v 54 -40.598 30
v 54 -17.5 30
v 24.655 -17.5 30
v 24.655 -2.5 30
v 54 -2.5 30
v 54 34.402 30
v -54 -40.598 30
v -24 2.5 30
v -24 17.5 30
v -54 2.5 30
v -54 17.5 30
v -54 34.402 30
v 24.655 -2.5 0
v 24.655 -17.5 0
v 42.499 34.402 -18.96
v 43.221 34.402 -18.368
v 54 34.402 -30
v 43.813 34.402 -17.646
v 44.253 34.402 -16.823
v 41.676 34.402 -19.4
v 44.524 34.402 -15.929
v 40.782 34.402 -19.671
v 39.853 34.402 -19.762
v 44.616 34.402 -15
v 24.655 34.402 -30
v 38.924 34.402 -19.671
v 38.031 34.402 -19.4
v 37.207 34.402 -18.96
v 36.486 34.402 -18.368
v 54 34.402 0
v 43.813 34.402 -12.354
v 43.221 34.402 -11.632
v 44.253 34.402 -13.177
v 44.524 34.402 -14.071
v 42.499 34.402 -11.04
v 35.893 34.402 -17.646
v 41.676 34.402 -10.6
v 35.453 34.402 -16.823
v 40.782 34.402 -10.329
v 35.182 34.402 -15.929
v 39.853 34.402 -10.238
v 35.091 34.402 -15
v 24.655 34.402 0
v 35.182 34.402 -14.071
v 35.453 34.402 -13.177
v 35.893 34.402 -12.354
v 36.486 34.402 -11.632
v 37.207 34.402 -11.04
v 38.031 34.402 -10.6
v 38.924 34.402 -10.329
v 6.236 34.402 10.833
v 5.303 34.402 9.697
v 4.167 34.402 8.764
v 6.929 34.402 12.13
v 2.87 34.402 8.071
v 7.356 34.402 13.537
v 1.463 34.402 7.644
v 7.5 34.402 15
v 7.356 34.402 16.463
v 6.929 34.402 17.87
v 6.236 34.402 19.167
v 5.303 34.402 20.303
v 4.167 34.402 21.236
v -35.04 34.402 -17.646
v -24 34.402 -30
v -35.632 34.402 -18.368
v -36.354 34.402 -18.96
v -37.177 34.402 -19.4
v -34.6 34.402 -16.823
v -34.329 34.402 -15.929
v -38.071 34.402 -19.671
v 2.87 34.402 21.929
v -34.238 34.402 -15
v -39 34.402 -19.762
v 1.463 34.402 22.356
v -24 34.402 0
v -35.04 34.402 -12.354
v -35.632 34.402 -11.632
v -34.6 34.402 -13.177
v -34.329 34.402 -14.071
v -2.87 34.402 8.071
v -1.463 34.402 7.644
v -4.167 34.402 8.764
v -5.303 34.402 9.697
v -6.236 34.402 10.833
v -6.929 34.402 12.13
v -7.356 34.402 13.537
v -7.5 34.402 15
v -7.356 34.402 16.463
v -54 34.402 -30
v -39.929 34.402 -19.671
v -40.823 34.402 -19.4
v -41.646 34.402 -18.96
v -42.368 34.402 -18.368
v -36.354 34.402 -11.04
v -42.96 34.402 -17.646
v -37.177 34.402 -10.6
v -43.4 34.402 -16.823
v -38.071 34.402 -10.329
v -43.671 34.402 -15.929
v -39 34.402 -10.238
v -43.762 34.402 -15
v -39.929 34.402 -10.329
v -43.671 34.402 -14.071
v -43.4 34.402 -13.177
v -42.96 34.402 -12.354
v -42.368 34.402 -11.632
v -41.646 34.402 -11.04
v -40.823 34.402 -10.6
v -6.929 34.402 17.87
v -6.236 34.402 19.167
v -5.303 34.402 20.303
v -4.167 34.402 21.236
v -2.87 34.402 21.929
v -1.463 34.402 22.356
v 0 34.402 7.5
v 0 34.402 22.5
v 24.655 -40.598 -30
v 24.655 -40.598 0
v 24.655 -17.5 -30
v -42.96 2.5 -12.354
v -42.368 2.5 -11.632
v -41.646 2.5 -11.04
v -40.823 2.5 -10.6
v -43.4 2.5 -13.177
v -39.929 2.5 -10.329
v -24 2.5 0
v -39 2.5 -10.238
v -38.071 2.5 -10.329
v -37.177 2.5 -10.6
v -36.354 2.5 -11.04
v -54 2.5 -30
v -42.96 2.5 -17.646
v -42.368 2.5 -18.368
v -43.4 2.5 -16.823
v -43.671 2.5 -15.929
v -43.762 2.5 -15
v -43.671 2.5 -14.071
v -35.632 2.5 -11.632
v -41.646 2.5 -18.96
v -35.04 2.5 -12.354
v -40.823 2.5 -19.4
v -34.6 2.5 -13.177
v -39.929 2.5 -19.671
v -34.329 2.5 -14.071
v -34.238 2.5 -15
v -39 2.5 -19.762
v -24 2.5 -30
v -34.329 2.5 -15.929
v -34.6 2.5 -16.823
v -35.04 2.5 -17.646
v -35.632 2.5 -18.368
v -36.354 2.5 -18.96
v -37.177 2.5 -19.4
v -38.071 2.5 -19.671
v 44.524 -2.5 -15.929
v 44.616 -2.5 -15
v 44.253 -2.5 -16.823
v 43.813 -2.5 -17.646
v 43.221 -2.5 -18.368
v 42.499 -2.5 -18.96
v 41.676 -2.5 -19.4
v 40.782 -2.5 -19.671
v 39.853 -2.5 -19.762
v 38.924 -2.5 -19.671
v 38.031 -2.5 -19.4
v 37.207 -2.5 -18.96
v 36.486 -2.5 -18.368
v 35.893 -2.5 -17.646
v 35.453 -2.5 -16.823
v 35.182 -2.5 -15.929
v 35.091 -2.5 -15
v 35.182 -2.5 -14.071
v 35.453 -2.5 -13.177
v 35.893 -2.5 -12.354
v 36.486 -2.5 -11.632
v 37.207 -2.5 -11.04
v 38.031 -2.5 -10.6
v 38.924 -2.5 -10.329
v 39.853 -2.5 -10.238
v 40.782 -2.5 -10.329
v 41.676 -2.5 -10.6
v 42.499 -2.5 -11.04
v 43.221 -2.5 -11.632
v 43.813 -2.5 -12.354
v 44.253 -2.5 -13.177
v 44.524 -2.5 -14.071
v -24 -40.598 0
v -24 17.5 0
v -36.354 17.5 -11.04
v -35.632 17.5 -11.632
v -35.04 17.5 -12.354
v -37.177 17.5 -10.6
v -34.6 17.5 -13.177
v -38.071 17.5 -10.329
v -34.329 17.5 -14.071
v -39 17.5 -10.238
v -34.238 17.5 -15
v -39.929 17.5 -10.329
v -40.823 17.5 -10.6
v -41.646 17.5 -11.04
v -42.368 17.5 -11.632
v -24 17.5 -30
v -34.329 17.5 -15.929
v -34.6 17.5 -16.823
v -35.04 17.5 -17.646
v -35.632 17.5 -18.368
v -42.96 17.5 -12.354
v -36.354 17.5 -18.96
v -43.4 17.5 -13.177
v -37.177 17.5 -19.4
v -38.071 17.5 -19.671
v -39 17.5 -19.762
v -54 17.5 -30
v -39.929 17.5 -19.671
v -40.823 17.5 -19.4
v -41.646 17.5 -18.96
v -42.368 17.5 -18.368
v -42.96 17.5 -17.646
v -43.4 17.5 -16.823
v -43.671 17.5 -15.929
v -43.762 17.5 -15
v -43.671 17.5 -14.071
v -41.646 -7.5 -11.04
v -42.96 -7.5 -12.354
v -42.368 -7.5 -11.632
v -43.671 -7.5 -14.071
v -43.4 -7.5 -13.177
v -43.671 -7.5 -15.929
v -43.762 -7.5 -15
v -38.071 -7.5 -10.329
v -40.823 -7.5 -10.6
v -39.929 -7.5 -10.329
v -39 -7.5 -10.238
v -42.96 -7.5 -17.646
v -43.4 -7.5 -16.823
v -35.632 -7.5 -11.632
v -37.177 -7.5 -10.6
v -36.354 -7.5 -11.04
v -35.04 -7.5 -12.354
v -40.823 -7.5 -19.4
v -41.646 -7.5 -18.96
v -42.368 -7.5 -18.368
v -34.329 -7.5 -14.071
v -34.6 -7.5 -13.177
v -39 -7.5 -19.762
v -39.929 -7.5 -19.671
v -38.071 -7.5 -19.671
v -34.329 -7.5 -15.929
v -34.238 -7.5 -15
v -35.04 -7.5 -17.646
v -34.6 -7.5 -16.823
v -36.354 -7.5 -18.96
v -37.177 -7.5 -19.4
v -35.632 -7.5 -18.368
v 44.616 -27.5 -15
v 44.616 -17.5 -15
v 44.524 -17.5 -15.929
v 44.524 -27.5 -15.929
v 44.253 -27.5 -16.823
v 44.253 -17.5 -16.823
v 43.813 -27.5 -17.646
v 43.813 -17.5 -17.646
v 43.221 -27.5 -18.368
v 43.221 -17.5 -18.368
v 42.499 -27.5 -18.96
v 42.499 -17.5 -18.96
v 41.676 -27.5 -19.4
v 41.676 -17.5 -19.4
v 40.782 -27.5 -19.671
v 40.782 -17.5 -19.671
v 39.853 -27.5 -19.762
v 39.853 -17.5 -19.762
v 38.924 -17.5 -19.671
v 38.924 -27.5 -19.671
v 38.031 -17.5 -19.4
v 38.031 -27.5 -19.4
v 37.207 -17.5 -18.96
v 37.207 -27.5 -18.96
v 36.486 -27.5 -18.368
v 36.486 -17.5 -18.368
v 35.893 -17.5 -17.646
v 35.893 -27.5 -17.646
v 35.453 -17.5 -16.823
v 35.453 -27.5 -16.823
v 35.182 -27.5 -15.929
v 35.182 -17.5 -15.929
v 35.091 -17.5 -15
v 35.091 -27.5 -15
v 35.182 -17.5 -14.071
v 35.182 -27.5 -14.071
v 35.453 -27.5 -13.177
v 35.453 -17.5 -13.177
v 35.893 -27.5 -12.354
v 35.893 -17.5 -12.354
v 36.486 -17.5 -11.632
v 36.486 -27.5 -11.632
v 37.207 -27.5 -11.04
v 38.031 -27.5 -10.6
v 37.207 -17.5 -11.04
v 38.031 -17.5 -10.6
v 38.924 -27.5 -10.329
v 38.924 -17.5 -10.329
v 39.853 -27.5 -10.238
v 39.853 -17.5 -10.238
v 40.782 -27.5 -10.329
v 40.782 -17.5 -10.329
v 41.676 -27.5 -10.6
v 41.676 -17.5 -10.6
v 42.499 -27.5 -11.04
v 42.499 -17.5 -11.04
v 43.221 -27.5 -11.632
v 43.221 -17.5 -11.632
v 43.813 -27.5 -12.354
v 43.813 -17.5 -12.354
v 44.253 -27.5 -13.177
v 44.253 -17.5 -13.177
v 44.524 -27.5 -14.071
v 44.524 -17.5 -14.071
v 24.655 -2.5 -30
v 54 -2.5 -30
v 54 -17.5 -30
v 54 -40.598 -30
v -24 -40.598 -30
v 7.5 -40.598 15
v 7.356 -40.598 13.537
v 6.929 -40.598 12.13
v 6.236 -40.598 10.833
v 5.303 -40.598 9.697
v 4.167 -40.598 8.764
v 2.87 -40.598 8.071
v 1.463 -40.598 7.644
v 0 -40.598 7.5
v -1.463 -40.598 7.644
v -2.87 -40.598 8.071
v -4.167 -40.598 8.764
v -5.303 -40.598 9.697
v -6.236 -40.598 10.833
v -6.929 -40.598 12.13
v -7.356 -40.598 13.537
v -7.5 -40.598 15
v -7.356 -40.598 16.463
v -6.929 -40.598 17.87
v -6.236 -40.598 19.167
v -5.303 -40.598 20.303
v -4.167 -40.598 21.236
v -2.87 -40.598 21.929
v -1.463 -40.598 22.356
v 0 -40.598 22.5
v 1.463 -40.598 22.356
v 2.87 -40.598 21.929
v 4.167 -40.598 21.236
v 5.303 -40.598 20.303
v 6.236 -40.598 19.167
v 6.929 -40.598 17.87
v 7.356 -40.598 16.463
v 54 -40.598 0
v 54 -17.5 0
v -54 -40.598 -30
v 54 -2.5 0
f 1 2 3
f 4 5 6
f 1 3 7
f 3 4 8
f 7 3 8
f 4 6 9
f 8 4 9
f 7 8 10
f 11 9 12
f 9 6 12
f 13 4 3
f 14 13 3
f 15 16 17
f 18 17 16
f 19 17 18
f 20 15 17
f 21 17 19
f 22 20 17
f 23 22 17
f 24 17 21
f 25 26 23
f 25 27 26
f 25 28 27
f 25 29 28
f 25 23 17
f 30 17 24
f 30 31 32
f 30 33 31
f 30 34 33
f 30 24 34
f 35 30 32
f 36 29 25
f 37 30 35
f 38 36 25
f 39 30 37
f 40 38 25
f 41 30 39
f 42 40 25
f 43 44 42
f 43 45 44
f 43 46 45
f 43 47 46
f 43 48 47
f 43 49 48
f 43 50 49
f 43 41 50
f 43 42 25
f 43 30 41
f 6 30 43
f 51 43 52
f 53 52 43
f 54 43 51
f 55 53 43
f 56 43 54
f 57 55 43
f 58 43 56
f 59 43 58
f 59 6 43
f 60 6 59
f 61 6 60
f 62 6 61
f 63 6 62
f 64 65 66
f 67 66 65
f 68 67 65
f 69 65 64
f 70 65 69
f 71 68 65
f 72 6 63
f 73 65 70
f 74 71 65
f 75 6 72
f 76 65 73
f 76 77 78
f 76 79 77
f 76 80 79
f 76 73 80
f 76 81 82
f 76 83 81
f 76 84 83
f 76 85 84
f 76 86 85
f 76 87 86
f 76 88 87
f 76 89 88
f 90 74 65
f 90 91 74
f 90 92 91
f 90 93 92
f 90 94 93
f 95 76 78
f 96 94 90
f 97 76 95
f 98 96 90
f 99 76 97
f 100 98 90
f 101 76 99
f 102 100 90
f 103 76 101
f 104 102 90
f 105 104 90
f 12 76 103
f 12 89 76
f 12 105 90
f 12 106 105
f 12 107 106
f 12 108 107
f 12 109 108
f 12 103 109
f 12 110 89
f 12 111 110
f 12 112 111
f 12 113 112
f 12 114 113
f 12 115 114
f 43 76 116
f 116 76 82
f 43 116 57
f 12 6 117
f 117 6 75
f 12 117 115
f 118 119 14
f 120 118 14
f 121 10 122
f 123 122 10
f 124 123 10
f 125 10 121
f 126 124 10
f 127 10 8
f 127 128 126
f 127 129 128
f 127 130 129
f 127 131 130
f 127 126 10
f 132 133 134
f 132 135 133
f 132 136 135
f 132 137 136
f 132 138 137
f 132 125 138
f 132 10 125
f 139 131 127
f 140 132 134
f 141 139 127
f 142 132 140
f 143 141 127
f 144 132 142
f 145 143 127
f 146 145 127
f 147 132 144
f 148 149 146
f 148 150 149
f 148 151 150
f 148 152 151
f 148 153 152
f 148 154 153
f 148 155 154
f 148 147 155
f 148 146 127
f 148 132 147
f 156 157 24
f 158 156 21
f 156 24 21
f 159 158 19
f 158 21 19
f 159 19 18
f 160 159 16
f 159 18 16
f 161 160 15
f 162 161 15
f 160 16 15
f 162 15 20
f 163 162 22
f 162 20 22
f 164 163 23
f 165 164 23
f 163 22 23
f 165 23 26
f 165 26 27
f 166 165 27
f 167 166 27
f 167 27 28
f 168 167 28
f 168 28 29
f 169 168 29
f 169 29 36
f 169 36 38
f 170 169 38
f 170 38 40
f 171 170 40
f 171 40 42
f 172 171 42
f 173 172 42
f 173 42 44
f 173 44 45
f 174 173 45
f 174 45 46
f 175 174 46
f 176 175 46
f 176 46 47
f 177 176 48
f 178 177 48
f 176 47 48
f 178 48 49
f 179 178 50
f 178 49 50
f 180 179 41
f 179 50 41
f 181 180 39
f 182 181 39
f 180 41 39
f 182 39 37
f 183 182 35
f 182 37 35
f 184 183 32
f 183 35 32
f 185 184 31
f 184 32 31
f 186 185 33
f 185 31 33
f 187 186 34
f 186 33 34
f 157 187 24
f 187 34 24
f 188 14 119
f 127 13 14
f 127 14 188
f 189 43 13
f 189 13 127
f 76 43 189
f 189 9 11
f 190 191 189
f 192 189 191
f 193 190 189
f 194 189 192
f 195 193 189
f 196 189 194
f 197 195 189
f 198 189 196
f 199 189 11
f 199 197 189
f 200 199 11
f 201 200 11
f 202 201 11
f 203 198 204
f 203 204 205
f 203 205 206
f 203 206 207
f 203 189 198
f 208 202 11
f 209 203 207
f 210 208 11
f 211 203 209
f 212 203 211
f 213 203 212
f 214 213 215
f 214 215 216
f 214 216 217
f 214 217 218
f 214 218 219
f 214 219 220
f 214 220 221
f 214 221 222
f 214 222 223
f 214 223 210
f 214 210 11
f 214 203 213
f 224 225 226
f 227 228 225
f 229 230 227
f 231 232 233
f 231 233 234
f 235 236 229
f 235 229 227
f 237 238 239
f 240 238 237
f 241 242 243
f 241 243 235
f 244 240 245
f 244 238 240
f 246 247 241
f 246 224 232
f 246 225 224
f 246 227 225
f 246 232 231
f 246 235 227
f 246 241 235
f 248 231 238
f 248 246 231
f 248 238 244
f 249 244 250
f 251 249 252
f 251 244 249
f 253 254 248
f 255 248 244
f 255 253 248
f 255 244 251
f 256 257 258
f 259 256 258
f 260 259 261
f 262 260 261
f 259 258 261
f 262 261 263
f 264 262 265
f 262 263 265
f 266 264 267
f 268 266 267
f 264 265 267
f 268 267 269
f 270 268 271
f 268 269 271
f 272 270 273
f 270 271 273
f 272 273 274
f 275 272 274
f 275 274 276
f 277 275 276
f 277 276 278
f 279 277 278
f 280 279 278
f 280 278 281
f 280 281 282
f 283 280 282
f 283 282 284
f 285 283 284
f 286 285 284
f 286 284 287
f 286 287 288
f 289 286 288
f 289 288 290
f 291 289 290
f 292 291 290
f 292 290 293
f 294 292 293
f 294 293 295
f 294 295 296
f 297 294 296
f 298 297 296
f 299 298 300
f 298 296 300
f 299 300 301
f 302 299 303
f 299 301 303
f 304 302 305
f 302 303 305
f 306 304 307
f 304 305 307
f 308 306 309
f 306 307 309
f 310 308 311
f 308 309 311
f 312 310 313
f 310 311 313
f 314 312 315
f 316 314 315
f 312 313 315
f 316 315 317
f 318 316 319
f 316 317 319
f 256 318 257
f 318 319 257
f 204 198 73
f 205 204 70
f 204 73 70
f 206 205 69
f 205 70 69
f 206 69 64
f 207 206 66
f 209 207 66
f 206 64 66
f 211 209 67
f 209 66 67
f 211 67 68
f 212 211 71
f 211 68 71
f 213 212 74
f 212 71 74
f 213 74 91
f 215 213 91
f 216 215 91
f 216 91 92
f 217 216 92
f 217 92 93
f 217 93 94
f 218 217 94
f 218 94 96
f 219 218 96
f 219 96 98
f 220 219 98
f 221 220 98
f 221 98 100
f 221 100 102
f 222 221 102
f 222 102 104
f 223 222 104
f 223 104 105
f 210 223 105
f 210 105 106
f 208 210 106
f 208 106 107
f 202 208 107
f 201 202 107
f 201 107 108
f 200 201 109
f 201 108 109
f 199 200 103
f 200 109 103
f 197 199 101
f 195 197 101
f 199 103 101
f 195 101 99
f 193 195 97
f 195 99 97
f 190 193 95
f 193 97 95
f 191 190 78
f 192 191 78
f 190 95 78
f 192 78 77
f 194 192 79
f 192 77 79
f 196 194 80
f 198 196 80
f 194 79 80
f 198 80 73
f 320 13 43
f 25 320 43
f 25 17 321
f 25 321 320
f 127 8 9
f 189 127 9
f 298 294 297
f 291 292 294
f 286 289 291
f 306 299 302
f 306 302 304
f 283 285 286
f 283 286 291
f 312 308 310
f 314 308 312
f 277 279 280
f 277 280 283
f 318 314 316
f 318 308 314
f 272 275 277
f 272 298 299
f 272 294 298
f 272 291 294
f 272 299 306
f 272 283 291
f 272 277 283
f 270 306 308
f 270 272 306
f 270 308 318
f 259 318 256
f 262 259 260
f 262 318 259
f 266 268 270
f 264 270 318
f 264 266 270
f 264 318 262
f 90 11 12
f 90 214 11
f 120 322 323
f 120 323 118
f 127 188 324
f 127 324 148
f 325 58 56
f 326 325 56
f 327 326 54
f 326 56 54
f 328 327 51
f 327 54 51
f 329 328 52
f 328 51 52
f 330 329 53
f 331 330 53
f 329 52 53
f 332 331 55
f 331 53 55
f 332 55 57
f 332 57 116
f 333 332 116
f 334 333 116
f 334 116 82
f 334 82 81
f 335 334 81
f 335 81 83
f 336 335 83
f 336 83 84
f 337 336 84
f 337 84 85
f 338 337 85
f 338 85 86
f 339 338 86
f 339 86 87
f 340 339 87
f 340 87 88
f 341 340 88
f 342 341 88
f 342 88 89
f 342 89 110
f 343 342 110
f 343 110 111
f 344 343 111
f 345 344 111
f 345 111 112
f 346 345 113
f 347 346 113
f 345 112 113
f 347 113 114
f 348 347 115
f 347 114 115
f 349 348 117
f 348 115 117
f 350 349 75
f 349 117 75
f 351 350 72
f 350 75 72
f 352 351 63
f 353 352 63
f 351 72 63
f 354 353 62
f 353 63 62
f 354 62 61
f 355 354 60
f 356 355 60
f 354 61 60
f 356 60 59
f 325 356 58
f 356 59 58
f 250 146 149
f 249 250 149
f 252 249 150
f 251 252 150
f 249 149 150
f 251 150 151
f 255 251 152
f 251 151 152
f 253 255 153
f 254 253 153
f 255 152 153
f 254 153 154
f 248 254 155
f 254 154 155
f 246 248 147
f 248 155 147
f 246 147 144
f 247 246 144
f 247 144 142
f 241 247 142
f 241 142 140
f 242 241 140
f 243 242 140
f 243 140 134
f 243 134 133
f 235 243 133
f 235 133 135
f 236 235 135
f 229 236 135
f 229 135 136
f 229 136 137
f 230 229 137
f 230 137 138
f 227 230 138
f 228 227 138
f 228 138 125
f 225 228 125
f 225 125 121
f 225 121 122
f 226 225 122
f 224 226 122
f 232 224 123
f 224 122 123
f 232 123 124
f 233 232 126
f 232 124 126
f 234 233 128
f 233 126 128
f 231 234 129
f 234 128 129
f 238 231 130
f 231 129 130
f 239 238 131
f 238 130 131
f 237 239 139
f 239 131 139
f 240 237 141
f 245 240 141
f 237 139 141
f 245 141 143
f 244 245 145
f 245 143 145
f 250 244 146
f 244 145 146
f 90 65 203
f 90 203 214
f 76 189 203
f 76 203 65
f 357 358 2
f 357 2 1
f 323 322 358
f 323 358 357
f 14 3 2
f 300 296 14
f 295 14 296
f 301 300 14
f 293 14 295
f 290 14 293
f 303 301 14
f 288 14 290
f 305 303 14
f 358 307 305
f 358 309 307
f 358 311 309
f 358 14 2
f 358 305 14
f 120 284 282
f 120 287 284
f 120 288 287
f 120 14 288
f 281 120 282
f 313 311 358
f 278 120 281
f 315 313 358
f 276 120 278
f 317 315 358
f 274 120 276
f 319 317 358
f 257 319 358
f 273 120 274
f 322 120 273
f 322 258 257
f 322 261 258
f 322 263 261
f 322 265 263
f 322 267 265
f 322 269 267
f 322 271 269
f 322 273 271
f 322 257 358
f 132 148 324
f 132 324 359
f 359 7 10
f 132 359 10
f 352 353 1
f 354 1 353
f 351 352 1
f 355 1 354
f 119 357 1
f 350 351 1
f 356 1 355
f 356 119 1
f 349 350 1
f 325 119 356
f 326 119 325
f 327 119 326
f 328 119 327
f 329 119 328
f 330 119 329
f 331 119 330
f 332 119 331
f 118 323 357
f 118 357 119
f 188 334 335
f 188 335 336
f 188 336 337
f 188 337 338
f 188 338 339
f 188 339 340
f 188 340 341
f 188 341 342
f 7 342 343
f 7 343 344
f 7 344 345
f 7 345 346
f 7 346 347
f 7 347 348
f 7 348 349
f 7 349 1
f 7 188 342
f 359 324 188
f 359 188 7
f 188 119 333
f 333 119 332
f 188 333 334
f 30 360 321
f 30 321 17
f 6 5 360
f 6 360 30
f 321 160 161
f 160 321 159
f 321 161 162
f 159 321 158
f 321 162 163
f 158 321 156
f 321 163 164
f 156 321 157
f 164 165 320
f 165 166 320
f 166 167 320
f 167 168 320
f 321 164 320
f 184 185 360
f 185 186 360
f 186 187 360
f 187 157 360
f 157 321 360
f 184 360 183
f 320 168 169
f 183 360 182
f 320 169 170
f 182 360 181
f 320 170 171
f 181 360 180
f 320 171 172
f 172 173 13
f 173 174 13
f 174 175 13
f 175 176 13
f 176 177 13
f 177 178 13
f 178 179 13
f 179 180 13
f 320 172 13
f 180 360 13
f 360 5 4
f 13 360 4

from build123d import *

# Parameters (mm, degrees)
BOSS_EXTRUDE1_DEPTH = 30
SKETCH3_R           = 7.5
CUT_EXTRUDE3_DEPTH  = 76
SKETCH4_W           = 29.345301095
SKETCH4_H           = 36.901717618
SKETCH4_H_2         = 23.098282382
SKETCH4_W_2         = 30
SKETCH4_H_3         = 43.098282382
SKETCH4_H_4         = 16.901717618
BOSS_EXTRUDE2_DEPTH = 30
SKETCH2_R           = 4.7625
CUT_EXTRUDE2_DEPTH  = 61.901718
SKETCH5_R           = 4.7625
CUT_EXTRUDE4_DEPTH  = 41.901718


with BuildPart() as part:
    # Sketch1 → Boss-Extrude1 (new body)
    with BuildSketch(Plane.XY):
        Polygon((-54, 34.401717618), (54, 34.401717618), (54, -2.5), (24.654698905, -2.5), (24.654698905, -17.5), (54, -17.5), (54, -40.598282382), (-54, -40.598282382), (-54, 2.5), (-24, 2.5), (-24, 17.5), (-54, 17.5), align=None)
    extrude(amount=BOSS_EXTRUDE1_DEPTH)

    # Sketch3 → Cut-Extrude3 (cut, through all)
    with BuildSketch(Plane(origin=(0, 34.401717618, 0), x_dir=(1, 0, 0), z_dir=(0, 1, 0))):
        with Locations((0, -15)):
            Circle(SKETCH3_R)
    extrude(amount=-CUT_EXTRUDE3_DEPTH, mode=Mode.SUBTRACT)

    # Sketch4 → Boss-Extrude2 (add)
    with BuildSketch(Plane(origin=(0, 0, 0), x_dir=(-1, 0, 0), z_dir=(0, 0, -1))):
        with Locations((-39.327349453, 15.950858809)):
            Rectangle(SKETCH4_W, SKETCH4_H)
        with Locations((-39.327349453, -29.049141191)):
            Rectangle(SKETCH4_W, SKETCH4_H_2)
        with Locations((39, -19.049141191)):
            Rectangle(SKETCH4_W_2, SKETCH4_H_3)
        with Locations((39, 25.950858809)):
            Rectangle(SKETCH4_W_2, SKETCH4_H_4)
    extrude(amount=BOSS_EXTRUDE2_DEPTH)

    # Sketch2 → Cut-Extrude2 (cut)
    with BuildSketch(Plane(origin=(0, 34.401717618, 0), x_dir=(1, 0, 0), z_dir=(0, 1, 0))):
        with Locations((39.853186988, 15)):
            Circle(SKETCH2_R)
    extrude(amount=-CUT_EXTRUDE2_DEPTH, mode=Mode.SUBTRACT)

    # Sketch5 → Cut-Extrude4 (cut)
    with BuildSketch(Plane(origin=(0, 34.401717618, 0), x_dir=(1, 0, 0), z_dir=(0, 1, 0))):
        with Locations((-39, 15)):
            Circle(SKETCH5_R)
    extrude(amount=-CUT_EXTRUDE4_DEPTH, mode=Mode.SUBTRACT)


solid = part.part
